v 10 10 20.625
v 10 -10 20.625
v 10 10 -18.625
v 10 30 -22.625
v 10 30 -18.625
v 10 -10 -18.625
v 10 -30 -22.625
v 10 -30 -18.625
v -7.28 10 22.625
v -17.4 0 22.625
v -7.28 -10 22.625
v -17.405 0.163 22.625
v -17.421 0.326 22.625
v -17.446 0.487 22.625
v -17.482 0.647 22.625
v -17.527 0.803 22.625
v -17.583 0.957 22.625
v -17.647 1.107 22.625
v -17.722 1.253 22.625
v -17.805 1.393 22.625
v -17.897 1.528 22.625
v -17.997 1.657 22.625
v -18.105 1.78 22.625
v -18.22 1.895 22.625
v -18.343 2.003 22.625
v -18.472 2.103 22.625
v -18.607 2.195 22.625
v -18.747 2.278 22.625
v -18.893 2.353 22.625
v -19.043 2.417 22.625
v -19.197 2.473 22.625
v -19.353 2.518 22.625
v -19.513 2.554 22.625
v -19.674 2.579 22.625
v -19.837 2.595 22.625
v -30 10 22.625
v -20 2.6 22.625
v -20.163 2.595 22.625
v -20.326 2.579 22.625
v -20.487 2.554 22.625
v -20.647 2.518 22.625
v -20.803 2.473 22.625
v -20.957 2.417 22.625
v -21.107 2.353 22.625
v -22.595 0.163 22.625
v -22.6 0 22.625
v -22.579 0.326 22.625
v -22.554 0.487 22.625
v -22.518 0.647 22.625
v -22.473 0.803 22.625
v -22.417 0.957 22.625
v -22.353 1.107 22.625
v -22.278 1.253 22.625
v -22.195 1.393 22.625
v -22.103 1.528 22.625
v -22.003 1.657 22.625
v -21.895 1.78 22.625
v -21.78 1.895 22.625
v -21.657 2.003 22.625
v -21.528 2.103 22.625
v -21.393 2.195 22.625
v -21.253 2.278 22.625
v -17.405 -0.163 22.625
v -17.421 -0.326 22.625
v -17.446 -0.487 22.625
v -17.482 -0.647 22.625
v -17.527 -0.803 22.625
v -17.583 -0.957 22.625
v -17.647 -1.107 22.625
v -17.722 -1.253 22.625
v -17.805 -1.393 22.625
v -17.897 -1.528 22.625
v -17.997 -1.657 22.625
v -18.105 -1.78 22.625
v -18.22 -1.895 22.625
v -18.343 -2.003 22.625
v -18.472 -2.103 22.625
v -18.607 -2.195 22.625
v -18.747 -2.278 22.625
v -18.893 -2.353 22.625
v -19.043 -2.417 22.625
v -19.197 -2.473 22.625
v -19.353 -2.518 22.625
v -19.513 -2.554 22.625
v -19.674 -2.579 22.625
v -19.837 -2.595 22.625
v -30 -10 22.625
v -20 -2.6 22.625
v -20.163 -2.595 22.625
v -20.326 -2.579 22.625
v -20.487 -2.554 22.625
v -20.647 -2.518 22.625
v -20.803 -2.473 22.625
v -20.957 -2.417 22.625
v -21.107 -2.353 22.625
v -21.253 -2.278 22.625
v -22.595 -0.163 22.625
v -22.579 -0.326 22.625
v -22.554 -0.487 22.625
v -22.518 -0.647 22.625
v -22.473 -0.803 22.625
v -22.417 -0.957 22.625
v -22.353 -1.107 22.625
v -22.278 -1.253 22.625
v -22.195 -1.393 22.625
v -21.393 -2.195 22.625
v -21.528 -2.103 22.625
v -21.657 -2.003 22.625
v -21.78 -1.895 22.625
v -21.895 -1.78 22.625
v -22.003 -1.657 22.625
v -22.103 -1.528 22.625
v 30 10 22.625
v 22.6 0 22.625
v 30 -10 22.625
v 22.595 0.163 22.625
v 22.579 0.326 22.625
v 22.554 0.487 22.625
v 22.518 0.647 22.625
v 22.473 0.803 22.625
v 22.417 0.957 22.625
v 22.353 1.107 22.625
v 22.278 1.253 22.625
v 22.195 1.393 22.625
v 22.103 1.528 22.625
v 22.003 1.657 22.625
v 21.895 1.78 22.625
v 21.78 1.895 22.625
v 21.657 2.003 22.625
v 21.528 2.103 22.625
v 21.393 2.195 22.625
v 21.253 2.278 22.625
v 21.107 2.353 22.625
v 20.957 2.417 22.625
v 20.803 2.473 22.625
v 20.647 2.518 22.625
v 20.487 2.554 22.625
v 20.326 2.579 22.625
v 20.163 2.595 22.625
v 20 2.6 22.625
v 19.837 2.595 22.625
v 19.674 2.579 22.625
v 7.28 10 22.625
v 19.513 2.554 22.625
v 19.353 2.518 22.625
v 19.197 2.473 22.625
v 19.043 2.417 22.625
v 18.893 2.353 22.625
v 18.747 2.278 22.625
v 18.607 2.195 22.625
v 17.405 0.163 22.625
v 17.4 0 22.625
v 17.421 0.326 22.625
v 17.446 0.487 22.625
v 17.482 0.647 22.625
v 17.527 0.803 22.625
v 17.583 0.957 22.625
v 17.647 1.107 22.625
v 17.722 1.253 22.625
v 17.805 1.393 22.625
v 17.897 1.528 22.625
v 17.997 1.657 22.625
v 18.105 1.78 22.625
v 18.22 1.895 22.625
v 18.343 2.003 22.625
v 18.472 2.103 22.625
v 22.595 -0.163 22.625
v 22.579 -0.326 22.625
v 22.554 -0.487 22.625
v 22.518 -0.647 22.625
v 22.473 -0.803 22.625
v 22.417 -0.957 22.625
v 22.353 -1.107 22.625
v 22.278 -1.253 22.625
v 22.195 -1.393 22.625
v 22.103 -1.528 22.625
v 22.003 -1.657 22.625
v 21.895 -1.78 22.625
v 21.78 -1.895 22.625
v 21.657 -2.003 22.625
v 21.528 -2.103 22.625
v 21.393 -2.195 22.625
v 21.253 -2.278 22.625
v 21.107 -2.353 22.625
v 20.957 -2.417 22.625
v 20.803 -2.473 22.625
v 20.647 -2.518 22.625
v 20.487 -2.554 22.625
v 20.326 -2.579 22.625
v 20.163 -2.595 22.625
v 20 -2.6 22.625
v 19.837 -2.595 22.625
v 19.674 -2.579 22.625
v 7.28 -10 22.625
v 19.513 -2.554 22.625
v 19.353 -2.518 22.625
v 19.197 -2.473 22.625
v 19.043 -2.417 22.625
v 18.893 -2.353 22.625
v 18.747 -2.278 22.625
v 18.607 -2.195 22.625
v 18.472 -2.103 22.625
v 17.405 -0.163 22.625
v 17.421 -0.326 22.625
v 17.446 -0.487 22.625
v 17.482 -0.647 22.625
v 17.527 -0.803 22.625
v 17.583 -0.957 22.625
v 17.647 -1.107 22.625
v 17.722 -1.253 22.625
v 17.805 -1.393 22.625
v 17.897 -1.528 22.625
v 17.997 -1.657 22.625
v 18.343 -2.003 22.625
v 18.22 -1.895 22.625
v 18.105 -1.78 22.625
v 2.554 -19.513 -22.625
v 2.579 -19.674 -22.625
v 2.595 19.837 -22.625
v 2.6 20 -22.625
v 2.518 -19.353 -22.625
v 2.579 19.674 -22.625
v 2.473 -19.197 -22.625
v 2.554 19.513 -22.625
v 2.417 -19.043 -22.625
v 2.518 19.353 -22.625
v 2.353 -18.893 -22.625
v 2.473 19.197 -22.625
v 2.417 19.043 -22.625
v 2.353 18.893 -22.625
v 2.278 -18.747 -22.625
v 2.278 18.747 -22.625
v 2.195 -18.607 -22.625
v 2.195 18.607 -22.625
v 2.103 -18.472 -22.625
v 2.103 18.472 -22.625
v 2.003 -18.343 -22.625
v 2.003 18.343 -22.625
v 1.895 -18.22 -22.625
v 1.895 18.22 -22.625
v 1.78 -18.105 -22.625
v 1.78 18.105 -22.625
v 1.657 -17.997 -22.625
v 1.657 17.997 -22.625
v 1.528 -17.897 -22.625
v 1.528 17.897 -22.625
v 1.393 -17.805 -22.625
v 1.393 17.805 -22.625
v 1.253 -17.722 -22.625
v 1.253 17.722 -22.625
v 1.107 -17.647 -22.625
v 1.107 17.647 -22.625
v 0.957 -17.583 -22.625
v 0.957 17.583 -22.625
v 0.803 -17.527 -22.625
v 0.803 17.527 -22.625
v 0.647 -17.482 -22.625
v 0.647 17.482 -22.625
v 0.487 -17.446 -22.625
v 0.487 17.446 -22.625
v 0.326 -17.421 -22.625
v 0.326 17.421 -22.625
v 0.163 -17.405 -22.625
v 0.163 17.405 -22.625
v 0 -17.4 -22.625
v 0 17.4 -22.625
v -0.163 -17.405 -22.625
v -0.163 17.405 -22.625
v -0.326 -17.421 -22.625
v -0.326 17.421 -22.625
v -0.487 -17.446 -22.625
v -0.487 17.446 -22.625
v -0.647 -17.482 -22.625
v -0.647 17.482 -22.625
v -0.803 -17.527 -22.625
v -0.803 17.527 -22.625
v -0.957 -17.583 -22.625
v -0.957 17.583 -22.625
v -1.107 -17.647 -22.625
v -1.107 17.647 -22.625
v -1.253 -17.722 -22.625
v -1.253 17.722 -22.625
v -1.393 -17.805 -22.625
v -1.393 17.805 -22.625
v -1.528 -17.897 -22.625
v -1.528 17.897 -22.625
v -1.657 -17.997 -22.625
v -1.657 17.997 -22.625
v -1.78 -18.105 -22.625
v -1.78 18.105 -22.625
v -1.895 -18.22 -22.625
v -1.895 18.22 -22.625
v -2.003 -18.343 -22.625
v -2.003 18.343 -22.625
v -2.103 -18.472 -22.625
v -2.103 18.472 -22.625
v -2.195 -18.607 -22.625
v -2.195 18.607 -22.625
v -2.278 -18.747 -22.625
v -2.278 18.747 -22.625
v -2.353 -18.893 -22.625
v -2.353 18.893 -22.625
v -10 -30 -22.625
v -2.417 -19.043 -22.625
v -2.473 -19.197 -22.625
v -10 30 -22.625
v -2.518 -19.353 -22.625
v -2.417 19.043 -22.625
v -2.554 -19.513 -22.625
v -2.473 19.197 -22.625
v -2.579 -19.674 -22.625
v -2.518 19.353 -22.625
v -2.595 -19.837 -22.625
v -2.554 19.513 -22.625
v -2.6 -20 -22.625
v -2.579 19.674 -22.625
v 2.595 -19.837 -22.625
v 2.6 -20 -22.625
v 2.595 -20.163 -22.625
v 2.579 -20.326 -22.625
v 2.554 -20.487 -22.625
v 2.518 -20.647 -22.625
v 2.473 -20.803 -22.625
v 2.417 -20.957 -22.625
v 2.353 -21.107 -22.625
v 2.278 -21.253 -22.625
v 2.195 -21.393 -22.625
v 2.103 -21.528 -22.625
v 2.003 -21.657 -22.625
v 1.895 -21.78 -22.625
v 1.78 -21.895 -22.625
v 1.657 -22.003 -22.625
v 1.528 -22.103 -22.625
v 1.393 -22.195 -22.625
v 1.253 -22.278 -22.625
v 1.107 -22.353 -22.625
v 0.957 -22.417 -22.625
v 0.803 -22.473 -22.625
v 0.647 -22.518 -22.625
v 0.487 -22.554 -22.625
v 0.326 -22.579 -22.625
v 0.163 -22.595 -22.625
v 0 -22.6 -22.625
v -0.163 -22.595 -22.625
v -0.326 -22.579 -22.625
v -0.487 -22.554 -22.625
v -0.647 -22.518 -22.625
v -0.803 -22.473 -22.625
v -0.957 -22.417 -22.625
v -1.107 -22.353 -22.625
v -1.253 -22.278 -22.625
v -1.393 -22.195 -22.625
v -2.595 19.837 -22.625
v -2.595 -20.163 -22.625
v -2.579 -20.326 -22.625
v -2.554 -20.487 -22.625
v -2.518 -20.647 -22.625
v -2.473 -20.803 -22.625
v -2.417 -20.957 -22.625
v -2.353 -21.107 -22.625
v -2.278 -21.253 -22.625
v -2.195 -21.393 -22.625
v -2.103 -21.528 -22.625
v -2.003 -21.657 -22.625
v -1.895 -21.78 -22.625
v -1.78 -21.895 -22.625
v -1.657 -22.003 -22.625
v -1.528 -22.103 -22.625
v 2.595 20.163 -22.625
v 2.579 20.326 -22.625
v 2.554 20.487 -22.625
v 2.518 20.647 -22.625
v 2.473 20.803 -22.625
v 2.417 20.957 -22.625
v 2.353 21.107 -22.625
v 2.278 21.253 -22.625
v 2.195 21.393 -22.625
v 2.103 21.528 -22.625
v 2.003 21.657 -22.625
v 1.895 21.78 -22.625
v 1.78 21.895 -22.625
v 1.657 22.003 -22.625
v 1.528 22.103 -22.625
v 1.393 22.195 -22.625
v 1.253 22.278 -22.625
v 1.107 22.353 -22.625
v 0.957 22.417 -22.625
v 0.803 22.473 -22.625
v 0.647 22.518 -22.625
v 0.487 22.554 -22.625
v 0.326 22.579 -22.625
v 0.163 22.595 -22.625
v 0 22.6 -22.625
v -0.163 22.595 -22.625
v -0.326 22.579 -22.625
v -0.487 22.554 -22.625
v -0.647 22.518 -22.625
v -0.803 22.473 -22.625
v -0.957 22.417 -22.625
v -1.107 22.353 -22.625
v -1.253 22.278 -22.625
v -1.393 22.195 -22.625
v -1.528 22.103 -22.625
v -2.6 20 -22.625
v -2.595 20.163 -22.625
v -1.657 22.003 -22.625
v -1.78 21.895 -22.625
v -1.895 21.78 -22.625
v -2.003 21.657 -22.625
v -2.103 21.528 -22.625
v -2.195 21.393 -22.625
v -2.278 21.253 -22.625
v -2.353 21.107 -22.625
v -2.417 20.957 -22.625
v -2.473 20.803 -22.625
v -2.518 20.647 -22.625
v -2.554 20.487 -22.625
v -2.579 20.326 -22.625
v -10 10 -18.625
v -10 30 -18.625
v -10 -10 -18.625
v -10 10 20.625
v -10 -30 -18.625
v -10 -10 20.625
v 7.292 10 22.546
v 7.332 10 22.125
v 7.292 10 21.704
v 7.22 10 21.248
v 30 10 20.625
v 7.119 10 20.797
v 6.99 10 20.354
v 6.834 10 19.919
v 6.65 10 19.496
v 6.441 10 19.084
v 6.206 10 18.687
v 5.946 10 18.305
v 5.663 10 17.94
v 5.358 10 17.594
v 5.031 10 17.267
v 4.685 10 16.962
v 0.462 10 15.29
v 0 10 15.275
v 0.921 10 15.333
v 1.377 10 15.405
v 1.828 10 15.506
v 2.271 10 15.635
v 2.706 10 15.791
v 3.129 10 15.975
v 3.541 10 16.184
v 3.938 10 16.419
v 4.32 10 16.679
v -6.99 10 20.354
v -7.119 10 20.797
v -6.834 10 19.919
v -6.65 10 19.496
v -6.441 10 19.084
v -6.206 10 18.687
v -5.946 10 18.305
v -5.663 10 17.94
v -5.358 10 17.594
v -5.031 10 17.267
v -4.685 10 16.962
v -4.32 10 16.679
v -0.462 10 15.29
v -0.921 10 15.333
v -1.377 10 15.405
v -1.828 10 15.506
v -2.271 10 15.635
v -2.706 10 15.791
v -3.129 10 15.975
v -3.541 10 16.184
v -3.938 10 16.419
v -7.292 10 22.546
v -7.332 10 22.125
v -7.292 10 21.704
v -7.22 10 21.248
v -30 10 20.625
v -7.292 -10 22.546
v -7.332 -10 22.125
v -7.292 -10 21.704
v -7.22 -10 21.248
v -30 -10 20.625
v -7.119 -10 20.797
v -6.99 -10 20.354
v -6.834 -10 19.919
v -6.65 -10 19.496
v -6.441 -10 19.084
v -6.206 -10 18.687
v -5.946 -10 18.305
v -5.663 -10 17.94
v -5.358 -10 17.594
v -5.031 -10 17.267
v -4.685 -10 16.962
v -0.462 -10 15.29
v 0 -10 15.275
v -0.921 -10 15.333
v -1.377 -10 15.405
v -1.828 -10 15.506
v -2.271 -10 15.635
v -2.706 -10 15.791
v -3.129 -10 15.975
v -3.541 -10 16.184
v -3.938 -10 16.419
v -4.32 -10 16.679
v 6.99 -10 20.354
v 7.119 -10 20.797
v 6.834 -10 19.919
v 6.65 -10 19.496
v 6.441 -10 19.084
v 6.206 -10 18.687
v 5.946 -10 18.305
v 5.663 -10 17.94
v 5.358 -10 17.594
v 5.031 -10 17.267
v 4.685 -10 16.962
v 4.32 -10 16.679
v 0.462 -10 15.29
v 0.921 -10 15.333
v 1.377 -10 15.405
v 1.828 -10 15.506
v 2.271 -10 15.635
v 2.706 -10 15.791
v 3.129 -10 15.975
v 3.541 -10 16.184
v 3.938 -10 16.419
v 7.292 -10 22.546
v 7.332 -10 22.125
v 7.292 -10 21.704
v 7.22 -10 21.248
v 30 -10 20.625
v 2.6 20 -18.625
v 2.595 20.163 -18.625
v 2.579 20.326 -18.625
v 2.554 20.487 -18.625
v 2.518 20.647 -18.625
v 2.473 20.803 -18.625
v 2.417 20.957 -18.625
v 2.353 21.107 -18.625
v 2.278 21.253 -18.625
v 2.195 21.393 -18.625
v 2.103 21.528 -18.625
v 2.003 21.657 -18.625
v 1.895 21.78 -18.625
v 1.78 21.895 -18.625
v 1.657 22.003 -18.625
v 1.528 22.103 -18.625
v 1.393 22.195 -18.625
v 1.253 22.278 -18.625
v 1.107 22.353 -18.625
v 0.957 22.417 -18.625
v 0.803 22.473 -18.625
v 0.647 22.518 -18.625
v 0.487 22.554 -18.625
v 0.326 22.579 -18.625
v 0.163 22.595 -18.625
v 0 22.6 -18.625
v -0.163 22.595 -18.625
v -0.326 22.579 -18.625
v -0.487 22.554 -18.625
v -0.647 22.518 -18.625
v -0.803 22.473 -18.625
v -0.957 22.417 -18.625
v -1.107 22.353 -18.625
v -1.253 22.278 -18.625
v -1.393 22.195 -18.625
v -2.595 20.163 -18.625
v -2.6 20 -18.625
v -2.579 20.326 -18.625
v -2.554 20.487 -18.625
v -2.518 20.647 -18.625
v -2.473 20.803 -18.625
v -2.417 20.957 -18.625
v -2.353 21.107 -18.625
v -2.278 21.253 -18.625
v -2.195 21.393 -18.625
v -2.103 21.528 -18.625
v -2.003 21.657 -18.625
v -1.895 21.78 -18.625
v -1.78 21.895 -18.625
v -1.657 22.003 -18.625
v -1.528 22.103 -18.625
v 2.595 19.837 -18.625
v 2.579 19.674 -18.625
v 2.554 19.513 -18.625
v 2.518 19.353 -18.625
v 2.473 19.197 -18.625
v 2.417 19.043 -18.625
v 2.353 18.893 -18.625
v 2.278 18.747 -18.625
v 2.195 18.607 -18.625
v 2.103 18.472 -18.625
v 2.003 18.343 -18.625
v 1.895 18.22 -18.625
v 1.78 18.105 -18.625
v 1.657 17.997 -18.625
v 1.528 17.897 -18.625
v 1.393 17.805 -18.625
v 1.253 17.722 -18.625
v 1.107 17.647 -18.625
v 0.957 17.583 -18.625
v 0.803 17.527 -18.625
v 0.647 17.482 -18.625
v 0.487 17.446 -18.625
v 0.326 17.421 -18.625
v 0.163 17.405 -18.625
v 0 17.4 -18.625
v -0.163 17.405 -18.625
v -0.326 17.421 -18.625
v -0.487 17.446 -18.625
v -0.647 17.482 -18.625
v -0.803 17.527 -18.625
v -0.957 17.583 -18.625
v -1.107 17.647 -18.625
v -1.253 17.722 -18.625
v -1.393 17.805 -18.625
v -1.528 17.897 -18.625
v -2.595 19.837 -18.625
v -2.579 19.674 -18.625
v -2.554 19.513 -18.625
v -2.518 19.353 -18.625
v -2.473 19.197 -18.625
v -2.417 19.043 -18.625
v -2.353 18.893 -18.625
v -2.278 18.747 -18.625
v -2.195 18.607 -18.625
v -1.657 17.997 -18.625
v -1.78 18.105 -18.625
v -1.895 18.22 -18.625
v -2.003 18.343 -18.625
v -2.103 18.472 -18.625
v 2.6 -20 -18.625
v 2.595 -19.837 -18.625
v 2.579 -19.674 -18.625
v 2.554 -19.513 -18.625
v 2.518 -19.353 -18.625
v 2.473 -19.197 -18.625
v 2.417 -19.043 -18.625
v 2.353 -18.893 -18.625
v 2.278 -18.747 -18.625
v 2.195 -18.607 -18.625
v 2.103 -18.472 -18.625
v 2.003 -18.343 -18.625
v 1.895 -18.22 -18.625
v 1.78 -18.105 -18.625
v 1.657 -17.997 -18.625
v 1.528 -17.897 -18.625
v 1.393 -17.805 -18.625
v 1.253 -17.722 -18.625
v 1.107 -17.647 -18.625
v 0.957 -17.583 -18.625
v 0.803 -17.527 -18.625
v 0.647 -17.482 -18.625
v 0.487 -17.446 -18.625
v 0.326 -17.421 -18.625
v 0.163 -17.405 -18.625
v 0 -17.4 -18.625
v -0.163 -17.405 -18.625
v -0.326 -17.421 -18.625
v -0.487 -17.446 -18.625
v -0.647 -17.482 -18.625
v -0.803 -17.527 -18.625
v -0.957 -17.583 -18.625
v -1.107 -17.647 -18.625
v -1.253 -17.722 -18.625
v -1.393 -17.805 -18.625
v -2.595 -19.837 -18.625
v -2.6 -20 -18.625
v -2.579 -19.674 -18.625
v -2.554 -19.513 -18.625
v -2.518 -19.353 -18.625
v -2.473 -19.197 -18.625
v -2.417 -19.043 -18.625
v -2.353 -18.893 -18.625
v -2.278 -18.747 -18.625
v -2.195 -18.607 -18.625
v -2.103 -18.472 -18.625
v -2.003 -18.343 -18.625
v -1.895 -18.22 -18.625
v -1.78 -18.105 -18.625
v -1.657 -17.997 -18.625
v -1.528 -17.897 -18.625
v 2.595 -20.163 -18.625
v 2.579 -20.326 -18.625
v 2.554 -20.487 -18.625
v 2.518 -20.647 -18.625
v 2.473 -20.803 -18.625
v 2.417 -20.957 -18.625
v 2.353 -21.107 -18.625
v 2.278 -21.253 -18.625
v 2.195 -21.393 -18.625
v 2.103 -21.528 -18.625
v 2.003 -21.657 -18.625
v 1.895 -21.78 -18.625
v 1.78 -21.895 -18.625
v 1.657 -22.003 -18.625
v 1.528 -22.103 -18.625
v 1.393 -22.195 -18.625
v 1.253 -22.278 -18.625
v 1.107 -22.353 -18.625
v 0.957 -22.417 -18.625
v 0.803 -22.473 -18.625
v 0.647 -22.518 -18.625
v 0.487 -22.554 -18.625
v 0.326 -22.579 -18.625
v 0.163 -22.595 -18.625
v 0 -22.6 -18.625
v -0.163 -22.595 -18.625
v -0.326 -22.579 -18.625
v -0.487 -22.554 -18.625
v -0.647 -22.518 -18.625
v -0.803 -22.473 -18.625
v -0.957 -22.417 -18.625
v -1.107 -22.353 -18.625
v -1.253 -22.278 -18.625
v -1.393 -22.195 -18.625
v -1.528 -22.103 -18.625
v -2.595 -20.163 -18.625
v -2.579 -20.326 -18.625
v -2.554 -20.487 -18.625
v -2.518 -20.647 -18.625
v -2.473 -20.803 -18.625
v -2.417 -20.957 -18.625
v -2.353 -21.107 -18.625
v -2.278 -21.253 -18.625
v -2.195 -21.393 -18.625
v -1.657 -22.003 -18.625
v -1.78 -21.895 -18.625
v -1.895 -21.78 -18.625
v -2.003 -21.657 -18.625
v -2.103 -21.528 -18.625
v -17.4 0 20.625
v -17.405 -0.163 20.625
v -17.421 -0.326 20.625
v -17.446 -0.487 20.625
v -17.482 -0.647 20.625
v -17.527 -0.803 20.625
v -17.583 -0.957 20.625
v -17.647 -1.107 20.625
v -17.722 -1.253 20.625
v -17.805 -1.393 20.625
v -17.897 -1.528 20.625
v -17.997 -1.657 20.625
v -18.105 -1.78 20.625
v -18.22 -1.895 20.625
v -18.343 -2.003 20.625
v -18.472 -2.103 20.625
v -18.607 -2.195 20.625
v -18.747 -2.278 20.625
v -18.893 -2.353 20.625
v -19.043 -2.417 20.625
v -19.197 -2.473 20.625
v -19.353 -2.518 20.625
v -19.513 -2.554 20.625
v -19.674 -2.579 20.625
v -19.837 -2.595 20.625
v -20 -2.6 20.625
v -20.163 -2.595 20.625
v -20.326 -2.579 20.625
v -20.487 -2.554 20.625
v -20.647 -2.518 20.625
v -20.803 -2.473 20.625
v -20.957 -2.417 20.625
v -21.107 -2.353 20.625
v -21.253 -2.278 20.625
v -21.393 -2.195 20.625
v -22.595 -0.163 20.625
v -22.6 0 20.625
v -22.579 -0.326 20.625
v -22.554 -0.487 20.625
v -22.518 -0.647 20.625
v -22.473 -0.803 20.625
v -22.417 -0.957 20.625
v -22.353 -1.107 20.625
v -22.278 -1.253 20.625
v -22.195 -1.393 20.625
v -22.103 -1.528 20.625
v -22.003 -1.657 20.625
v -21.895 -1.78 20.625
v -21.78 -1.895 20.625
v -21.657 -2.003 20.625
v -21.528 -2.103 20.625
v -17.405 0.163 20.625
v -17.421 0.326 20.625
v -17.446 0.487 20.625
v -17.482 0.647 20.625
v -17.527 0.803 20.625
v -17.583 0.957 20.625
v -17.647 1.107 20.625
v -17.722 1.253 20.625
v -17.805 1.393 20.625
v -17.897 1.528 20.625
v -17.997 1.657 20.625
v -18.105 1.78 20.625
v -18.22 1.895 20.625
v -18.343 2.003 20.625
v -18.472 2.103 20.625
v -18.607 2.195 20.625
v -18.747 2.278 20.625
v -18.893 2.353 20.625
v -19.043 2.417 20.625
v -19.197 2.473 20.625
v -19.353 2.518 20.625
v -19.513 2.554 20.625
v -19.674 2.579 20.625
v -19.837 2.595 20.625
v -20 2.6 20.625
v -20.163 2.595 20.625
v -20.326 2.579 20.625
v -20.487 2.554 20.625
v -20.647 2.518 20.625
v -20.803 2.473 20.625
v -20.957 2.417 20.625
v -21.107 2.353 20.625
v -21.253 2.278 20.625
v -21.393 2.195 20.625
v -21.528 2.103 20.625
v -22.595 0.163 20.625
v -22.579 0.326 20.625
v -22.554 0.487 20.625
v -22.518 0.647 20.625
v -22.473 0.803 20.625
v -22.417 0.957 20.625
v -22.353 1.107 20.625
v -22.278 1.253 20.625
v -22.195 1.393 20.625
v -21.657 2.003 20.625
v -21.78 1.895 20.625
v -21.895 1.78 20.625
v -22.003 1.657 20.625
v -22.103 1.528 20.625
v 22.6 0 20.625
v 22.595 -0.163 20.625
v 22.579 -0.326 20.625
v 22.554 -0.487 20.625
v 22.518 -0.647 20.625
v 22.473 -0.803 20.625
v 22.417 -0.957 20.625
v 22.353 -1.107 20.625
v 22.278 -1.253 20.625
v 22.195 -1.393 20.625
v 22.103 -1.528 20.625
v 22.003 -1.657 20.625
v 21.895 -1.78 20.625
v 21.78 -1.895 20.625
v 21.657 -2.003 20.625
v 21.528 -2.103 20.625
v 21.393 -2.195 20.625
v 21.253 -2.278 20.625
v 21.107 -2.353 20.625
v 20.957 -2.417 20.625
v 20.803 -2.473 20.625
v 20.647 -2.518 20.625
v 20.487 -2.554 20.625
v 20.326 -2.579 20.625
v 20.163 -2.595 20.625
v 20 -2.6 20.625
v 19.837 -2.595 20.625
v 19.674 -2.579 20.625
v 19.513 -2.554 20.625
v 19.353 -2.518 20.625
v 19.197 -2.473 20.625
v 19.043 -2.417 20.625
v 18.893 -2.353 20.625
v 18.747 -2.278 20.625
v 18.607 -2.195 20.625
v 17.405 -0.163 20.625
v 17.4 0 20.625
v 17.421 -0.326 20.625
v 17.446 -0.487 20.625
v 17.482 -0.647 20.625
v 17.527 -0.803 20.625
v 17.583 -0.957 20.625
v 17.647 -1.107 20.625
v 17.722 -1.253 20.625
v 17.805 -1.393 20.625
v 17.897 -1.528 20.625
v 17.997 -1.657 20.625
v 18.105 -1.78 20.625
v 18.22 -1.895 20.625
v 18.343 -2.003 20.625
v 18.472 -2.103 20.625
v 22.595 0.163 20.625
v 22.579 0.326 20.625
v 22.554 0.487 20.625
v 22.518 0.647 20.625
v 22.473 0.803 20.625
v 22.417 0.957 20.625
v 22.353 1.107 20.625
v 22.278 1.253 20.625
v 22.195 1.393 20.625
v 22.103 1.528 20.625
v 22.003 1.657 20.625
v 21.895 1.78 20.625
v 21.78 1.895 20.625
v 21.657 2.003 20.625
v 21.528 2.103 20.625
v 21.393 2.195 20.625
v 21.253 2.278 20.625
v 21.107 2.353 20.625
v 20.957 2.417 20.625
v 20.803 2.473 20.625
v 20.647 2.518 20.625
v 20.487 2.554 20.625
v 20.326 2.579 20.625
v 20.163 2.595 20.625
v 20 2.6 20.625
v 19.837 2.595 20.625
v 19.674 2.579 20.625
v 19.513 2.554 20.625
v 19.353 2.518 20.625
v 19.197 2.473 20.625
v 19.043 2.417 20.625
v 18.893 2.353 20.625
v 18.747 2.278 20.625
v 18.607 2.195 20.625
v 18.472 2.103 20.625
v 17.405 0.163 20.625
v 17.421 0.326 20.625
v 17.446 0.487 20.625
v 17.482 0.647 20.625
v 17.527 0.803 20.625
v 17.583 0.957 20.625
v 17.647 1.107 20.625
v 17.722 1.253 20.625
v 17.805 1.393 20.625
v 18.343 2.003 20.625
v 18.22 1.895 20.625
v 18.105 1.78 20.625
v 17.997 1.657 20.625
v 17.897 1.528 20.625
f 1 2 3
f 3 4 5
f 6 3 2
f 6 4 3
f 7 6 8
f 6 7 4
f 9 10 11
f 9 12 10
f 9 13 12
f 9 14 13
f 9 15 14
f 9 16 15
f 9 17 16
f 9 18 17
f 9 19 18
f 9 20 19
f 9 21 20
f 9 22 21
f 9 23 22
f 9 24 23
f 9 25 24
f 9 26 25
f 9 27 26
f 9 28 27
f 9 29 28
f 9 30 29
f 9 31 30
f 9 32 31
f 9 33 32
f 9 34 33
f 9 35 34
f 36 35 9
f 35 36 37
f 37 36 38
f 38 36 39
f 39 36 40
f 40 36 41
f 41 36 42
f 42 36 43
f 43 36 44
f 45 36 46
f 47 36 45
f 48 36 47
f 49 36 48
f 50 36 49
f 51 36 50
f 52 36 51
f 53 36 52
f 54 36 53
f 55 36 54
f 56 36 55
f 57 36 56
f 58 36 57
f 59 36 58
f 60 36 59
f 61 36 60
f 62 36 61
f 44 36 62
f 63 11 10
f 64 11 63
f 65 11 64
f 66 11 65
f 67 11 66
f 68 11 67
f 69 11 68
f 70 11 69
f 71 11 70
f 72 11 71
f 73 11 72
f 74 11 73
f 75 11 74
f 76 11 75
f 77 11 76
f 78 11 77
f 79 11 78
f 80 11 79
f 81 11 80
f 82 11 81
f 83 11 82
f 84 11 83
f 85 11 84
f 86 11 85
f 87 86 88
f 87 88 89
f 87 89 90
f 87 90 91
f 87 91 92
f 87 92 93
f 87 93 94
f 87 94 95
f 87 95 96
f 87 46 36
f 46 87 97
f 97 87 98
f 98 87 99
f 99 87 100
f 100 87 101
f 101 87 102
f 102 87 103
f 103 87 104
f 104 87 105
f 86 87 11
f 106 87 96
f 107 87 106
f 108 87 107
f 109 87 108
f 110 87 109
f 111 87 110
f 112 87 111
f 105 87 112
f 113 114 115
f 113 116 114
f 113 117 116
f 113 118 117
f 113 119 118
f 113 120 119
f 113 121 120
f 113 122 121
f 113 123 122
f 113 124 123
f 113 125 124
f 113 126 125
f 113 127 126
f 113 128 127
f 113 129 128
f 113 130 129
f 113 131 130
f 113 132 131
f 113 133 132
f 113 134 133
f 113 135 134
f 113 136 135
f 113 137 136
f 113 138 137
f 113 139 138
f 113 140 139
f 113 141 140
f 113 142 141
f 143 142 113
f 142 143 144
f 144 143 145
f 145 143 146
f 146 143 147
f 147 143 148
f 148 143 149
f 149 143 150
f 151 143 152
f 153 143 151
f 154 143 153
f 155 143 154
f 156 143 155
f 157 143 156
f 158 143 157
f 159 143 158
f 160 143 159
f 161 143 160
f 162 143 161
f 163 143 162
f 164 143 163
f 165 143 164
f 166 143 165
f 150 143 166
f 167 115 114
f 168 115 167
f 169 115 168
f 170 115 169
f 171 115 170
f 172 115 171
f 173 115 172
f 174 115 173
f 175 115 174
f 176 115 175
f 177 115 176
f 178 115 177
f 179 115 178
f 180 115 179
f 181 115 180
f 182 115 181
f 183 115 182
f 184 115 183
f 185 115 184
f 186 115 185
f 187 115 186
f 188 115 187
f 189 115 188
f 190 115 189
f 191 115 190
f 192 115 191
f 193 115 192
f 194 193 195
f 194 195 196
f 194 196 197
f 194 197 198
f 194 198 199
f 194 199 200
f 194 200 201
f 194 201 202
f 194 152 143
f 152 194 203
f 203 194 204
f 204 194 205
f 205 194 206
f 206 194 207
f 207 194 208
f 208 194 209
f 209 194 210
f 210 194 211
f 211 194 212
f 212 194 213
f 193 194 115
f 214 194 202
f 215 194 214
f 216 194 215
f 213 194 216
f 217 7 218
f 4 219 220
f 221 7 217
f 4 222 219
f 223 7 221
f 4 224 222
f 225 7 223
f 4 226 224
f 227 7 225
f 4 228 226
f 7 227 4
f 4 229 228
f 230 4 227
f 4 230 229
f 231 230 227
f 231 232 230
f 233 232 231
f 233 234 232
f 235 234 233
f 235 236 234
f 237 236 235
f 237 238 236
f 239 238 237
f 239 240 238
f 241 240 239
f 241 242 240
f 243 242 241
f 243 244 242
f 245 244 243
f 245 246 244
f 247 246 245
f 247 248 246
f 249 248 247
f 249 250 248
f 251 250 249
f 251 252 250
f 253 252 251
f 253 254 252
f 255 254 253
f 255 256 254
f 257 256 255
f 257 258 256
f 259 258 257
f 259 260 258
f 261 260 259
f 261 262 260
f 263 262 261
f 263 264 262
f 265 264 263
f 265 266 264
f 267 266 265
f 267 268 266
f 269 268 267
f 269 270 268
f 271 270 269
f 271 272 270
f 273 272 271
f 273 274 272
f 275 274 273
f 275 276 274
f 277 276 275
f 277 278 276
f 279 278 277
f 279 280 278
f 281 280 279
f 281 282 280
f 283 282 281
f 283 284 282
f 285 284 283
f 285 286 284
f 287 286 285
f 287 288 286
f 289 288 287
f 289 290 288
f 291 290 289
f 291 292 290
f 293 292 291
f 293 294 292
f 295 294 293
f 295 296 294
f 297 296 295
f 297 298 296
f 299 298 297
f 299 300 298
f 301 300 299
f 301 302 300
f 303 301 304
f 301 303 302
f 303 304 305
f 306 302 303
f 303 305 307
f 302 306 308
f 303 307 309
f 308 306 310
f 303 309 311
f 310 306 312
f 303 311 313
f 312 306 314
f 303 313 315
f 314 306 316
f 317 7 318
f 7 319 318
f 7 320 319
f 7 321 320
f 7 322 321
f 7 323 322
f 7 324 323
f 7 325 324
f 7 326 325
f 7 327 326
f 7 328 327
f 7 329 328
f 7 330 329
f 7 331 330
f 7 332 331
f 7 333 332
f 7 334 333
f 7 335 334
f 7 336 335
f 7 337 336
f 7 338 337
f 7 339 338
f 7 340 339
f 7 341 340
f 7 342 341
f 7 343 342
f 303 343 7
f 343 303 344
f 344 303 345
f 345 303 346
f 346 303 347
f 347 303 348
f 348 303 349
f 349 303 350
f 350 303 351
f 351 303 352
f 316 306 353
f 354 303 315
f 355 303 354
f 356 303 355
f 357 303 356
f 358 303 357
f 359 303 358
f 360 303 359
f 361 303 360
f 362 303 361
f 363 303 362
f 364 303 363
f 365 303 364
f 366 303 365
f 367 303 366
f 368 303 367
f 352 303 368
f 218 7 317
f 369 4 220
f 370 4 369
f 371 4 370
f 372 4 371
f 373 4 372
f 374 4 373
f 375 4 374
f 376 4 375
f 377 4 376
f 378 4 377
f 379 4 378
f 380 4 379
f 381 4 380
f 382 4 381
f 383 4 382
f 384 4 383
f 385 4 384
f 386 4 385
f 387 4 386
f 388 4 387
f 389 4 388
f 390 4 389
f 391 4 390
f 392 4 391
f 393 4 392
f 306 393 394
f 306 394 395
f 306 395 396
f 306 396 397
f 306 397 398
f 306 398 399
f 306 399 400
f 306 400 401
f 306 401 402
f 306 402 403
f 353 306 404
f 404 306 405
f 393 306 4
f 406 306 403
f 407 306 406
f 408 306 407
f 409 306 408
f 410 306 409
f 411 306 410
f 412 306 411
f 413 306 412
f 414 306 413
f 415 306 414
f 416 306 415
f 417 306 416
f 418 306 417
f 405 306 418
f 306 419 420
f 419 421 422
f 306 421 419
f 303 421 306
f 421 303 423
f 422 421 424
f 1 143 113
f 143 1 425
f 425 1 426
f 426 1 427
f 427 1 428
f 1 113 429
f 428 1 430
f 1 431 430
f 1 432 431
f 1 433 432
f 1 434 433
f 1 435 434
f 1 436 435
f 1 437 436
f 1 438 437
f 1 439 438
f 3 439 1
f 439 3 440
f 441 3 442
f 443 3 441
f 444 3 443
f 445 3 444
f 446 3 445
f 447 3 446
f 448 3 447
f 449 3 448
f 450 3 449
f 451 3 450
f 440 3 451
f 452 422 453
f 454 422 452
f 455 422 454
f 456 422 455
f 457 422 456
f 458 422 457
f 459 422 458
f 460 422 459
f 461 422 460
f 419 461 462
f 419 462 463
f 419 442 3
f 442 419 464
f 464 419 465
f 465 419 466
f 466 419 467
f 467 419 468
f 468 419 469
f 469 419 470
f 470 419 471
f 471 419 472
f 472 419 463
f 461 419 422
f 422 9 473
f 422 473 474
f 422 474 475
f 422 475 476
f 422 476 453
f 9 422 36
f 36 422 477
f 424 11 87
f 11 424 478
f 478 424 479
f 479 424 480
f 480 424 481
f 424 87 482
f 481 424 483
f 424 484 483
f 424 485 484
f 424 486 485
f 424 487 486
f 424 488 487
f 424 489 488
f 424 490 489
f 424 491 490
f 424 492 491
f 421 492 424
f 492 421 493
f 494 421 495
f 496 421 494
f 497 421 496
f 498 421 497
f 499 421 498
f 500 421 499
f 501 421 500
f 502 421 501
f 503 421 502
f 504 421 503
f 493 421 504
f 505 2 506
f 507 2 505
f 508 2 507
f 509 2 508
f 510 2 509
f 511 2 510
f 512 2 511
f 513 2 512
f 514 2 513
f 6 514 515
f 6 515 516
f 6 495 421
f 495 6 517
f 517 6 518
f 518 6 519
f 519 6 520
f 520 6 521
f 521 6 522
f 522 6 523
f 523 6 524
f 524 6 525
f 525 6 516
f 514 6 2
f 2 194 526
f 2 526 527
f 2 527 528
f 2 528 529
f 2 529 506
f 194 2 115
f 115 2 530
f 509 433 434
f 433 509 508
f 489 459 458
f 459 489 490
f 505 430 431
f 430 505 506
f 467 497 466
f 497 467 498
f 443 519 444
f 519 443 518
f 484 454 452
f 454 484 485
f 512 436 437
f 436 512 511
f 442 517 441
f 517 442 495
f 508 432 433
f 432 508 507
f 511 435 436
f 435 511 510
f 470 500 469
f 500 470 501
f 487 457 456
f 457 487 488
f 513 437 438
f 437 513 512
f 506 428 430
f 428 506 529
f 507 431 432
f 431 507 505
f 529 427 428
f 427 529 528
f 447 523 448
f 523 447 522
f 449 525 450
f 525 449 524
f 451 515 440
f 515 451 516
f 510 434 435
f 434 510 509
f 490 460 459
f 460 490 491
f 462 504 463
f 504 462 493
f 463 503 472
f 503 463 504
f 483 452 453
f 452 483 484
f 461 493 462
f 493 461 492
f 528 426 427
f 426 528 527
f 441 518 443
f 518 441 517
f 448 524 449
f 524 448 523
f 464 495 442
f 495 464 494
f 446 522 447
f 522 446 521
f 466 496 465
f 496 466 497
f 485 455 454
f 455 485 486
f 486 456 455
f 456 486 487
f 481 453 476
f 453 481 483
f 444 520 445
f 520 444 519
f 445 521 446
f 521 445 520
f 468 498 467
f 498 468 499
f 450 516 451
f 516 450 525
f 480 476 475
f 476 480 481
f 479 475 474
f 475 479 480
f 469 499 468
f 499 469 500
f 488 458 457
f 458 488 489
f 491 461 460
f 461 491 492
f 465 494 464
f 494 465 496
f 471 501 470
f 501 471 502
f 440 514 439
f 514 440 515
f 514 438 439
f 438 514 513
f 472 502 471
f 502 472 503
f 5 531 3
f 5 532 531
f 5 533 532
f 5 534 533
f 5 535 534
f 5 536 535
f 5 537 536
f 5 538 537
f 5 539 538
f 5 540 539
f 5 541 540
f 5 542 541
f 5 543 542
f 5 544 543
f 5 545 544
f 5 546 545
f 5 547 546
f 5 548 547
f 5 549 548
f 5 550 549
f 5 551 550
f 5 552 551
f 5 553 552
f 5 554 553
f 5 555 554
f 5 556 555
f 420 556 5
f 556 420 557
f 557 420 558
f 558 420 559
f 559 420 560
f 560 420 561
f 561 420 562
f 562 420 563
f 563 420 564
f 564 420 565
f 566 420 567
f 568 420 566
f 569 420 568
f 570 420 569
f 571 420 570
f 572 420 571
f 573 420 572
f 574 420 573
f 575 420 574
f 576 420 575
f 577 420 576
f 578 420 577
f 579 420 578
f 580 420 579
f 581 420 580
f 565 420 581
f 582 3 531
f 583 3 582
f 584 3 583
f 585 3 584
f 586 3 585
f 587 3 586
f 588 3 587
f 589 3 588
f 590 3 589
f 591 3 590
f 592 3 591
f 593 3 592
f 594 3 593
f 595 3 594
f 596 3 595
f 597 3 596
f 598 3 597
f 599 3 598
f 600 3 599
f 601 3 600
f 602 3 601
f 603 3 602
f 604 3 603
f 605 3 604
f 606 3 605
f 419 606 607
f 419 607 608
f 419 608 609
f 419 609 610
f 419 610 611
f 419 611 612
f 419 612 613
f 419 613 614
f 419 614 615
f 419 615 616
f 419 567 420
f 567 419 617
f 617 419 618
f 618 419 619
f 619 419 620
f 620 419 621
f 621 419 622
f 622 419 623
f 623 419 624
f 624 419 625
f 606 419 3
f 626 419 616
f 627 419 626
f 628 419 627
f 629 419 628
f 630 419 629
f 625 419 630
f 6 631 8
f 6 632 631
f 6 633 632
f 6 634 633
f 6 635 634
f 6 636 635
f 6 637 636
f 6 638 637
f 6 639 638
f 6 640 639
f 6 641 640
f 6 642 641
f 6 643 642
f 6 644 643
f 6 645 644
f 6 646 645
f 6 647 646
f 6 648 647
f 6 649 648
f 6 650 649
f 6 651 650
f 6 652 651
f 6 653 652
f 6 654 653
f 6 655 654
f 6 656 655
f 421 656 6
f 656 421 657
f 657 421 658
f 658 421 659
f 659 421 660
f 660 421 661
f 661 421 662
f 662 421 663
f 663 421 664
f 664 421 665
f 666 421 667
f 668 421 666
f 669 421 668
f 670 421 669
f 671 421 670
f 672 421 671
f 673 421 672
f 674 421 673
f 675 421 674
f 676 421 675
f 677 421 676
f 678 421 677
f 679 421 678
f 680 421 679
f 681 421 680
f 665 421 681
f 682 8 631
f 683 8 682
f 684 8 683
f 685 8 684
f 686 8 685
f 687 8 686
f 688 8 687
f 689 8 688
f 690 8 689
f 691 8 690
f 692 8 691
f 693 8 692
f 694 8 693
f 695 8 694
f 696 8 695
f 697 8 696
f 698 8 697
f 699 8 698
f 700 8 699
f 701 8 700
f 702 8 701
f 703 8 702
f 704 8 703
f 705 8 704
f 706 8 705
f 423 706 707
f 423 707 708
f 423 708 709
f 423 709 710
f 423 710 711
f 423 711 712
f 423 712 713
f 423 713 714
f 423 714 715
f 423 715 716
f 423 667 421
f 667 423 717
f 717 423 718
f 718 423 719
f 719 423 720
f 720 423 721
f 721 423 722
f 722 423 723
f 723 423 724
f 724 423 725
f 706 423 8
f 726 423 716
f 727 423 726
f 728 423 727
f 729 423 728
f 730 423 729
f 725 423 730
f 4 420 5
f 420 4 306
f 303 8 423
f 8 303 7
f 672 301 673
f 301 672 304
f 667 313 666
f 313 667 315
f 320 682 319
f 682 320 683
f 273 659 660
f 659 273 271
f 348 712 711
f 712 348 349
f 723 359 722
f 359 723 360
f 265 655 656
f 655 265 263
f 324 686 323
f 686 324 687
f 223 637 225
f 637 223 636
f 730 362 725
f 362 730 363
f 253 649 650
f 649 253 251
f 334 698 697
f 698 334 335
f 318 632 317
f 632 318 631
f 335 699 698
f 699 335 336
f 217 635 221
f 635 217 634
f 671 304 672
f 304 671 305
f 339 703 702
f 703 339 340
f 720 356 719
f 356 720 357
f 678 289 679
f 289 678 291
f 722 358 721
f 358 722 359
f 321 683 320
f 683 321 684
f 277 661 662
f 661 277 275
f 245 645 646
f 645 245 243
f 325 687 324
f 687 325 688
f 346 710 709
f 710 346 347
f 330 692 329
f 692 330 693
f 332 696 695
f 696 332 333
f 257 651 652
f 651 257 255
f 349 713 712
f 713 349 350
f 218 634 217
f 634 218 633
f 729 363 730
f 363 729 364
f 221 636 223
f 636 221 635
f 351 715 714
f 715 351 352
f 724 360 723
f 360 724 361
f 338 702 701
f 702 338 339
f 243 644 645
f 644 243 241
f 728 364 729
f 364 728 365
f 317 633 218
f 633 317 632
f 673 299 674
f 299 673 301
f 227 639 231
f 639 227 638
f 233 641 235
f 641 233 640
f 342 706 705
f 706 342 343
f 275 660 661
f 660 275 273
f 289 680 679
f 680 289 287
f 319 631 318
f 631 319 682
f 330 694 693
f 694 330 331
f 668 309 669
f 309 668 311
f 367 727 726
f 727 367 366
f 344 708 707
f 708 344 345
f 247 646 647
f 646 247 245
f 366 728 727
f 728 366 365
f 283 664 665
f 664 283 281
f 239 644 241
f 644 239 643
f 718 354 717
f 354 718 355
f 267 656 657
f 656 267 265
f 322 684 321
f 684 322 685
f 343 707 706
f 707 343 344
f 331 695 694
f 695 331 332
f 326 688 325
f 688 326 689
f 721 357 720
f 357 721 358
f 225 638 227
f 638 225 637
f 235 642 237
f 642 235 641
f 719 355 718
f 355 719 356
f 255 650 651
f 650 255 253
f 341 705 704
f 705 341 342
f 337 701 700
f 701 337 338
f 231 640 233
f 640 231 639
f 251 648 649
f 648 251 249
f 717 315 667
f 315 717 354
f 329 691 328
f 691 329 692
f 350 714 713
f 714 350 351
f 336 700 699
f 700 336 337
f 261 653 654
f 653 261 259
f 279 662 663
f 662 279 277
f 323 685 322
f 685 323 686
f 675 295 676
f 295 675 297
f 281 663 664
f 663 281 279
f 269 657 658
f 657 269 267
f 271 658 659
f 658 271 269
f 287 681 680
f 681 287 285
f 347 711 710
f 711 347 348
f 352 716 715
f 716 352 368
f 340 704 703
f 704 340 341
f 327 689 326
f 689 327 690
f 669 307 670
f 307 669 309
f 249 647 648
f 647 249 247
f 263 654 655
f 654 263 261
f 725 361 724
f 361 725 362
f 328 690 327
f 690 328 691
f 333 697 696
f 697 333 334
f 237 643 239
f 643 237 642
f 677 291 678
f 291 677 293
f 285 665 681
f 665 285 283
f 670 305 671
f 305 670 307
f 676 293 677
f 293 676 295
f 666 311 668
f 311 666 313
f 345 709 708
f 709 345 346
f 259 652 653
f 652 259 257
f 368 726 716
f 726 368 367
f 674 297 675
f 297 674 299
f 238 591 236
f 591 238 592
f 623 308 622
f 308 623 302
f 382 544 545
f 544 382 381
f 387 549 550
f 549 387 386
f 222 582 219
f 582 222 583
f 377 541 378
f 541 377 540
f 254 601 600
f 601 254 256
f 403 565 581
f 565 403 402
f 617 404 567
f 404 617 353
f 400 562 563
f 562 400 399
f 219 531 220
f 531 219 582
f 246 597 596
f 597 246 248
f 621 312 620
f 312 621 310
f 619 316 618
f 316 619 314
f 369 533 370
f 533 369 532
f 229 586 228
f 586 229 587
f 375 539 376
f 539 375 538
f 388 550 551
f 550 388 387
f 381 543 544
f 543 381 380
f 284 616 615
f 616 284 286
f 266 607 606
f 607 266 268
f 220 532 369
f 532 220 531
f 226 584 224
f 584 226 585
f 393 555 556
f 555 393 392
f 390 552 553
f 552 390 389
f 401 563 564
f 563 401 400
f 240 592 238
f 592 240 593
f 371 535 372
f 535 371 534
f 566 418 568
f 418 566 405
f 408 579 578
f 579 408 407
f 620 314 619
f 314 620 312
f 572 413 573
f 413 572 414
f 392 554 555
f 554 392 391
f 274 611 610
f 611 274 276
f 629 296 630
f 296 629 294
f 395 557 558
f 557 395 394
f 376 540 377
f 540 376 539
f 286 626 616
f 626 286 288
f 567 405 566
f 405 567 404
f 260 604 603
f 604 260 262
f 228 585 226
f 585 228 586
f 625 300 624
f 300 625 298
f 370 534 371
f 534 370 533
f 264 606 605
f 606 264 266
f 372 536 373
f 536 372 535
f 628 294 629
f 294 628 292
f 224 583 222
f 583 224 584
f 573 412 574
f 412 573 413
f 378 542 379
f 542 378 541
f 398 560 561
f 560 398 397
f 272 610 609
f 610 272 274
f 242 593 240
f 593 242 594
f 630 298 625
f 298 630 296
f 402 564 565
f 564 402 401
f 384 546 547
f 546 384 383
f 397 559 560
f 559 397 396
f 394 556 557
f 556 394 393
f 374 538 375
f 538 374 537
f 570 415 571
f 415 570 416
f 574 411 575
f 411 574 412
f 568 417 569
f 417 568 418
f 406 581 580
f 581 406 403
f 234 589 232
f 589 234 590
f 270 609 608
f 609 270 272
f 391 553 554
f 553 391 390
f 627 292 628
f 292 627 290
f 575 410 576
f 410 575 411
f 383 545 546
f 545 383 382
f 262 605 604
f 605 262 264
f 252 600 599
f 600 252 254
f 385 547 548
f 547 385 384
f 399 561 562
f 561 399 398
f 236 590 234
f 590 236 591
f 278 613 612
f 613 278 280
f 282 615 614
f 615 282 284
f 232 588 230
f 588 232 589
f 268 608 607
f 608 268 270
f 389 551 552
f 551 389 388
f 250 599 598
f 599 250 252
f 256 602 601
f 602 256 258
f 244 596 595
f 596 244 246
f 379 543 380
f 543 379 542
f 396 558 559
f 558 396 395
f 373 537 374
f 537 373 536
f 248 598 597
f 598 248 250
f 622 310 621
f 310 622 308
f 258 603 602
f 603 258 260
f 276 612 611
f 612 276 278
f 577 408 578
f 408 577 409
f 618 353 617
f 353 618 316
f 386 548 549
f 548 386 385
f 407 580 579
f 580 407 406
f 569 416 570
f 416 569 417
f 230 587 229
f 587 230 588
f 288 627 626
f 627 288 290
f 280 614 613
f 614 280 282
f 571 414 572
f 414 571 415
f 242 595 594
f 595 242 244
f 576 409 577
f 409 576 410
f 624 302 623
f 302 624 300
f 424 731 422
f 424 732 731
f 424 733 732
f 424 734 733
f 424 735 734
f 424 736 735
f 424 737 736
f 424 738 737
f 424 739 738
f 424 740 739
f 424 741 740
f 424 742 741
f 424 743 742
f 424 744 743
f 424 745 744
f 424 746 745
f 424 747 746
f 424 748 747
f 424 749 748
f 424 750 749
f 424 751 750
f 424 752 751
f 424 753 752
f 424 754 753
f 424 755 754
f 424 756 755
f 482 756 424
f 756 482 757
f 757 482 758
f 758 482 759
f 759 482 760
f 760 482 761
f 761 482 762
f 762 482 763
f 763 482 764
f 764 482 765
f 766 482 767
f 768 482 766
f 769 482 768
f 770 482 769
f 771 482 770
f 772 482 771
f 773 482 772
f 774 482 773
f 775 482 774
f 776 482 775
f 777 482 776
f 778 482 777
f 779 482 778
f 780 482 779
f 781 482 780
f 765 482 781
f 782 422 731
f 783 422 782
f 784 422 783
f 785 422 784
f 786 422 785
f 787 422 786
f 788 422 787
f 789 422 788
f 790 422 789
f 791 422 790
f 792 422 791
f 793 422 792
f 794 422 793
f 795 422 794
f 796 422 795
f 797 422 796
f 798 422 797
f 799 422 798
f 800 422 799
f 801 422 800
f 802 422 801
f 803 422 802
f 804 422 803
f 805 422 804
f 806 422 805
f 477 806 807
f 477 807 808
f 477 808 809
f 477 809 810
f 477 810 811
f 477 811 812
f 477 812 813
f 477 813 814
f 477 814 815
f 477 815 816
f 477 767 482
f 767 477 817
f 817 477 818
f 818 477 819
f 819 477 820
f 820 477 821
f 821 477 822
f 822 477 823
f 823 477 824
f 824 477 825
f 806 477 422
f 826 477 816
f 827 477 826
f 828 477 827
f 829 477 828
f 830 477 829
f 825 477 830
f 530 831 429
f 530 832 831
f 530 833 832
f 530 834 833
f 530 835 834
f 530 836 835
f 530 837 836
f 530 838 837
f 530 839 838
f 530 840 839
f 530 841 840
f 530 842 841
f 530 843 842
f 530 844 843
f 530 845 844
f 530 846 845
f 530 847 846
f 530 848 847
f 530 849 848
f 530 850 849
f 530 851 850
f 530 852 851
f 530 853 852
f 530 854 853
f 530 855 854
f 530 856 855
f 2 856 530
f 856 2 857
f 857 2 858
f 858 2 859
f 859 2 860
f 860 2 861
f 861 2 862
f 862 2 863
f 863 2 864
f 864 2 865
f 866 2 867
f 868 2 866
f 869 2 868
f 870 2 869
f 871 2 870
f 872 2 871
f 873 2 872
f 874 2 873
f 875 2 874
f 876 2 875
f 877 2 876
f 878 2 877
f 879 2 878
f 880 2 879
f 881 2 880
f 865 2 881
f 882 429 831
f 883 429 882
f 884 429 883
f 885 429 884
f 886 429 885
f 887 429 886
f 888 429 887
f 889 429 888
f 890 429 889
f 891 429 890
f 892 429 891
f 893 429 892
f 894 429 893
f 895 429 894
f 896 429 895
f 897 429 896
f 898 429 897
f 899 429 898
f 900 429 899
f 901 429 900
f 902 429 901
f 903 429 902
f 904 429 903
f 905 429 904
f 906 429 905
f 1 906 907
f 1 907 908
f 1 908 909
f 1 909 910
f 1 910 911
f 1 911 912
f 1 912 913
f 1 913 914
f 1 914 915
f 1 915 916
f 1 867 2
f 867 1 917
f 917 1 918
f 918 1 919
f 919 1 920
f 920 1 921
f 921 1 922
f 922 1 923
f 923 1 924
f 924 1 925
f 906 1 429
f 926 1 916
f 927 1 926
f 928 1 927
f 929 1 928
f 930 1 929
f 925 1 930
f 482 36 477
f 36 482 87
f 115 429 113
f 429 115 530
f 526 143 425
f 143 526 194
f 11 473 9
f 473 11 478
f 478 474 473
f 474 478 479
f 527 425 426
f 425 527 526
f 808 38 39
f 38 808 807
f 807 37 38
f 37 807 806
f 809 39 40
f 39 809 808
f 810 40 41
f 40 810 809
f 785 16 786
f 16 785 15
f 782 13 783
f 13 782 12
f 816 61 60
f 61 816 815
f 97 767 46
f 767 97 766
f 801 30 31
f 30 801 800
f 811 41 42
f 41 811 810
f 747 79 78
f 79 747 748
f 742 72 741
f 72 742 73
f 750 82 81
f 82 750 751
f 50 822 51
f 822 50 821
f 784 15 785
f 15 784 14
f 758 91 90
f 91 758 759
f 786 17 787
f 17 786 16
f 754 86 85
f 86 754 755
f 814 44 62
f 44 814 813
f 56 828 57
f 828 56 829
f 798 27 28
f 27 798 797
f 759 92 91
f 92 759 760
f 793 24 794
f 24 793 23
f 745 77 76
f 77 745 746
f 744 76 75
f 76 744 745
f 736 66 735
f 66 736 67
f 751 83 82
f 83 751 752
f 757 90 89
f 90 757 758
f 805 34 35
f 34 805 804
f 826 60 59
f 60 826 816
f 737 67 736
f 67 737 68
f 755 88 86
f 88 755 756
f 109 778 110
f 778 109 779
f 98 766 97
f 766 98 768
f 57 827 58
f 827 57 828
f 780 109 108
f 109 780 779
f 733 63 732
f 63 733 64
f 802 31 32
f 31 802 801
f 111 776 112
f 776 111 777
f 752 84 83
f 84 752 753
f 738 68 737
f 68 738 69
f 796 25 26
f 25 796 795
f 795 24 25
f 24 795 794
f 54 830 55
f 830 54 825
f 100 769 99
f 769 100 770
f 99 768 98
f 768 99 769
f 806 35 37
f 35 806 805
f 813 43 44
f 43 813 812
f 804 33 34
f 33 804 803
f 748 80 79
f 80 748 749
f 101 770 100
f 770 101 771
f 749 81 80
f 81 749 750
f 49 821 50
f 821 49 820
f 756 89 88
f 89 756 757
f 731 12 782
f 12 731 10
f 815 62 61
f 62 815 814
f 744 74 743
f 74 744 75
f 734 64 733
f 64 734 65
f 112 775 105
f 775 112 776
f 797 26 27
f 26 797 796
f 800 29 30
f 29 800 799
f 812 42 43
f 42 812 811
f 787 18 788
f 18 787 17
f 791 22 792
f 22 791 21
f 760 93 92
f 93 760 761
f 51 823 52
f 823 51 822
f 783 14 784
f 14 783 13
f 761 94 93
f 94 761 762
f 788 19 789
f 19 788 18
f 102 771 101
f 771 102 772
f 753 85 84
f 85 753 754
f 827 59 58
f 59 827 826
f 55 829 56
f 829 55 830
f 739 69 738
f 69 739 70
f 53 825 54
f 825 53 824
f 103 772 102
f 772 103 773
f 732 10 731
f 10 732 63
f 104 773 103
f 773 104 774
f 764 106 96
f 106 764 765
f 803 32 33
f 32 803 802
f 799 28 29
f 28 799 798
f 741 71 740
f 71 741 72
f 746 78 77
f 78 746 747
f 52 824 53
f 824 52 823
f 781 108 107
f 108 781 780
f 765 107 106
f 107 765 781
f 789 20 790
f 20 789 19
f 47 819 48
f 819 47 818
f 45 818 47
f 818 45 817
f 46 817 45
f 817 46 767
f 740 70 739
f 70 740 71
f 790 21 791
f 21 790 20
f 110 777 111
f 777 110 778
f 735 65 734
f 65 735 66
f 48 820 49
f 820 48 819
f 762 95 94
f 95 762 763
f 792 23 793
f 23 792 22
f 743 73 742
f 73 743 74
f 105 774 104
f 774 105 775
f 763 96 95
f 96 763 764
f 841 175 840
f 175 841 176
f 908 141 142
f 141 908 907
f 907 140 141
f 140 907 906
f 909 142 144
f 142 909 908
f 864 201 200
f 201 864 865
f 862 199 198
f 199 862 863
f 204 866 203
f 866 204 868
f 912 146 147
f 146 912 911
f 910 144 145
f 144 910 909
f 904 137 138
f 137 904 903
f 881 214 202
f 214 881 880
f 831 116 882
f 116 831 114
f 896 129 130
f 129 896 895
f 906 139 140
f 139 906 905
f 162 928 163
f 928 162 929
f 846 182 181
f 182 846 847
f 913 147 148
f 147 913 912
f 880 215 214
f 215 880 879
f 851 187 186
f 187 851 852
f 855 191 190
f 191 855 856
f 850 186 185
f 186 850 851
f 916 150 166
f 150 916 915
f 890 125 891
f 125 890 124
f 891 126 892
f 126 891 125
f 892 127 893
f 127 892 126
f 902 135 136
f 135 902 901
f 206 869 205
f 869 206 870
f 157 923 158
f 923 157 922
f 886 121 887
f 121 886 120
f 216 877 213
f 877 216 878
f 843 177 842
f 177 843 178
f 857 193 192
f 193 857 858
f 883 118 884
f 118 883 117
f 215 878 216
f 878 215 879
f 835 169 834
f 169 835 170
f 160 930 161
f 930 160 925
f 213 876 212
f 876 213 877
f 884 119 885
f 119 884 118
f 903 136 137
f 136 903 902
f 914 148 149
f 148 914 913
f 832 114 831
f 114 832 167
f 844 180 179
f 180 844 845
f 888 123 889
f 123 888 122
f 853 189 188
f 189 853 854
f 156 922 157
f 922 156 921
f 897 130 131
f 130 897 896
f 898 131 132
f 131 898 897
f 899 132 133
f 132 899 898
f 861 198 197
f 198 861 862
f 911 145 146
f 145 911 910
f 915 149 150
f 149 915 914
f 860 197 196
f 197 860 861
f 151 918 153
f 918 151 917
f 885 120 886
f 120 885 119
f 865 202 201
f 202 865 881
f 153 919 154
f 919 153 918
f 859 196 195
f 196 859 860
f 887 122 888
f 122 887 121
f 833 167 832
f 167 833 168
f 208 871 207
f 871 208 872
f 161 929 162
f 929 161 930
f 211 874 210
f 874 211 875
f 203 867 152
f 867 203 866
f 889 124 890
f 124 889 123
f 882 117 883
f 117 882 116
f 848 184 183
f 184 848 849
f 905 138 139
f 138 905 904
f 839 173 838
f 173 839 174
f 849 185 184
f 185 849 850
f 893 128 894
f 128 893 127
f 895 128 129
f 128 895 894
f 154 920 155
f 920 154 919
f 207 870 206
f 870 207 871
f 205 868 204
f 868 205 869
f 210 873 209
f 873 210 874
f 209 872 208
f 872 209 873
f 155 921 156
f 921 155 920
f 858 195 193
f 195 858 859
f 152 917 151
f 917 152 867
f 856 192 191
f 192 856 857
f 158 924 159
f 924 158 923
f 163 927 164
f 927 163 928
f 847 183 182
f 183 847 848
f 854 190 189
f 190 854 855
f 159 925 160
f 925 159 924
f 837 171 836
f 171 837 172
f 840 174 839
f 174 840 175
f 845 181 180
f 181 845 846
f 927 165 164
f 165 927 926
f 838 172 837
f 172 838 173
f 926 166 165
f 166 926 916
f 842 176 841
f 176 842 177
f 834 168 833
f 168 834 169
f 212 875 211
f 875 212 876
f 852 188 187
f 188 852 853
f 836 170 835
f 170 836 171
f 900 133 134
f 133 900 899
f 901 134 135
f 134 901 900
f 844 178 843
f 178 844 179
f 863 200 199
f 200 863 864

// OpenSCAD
$fn=100;

w=20;
l=20;
w2=10.5;
h=40 + w2/2;
in=25.4;
r=25.4/4+1;

difference(){
    
    cube([w,l,h],center=true);
    
    translate([0,0,h/2])
    rotate([90,0,0])
    translate([0,0,-h/2])
    cylinder(h,r,r);  }

translate([0,0,-(h/2-2)])
    
difference(){
    cube([w,l*3,4],center=true);
    translate([0,-l,-5])
    cylinder(20,2.6,2.6);
    translate([0,l,-5])
    cylinder(20,2.6,2.6);
    
}
translate([0,0,(h/2-1)])
rotate([0,0,90])
difference(){
    cube([l,l*3,2],center=true);
    rotate([0,90,0])
    translate([0,0,-h/2])
    cylinder(h,r,r);    
    translate([0,l,-5])
    cylinder(20,2.6,2.6);
    translate([0,-l,-5])
    cylinder(20,2.6,2.6);
}
